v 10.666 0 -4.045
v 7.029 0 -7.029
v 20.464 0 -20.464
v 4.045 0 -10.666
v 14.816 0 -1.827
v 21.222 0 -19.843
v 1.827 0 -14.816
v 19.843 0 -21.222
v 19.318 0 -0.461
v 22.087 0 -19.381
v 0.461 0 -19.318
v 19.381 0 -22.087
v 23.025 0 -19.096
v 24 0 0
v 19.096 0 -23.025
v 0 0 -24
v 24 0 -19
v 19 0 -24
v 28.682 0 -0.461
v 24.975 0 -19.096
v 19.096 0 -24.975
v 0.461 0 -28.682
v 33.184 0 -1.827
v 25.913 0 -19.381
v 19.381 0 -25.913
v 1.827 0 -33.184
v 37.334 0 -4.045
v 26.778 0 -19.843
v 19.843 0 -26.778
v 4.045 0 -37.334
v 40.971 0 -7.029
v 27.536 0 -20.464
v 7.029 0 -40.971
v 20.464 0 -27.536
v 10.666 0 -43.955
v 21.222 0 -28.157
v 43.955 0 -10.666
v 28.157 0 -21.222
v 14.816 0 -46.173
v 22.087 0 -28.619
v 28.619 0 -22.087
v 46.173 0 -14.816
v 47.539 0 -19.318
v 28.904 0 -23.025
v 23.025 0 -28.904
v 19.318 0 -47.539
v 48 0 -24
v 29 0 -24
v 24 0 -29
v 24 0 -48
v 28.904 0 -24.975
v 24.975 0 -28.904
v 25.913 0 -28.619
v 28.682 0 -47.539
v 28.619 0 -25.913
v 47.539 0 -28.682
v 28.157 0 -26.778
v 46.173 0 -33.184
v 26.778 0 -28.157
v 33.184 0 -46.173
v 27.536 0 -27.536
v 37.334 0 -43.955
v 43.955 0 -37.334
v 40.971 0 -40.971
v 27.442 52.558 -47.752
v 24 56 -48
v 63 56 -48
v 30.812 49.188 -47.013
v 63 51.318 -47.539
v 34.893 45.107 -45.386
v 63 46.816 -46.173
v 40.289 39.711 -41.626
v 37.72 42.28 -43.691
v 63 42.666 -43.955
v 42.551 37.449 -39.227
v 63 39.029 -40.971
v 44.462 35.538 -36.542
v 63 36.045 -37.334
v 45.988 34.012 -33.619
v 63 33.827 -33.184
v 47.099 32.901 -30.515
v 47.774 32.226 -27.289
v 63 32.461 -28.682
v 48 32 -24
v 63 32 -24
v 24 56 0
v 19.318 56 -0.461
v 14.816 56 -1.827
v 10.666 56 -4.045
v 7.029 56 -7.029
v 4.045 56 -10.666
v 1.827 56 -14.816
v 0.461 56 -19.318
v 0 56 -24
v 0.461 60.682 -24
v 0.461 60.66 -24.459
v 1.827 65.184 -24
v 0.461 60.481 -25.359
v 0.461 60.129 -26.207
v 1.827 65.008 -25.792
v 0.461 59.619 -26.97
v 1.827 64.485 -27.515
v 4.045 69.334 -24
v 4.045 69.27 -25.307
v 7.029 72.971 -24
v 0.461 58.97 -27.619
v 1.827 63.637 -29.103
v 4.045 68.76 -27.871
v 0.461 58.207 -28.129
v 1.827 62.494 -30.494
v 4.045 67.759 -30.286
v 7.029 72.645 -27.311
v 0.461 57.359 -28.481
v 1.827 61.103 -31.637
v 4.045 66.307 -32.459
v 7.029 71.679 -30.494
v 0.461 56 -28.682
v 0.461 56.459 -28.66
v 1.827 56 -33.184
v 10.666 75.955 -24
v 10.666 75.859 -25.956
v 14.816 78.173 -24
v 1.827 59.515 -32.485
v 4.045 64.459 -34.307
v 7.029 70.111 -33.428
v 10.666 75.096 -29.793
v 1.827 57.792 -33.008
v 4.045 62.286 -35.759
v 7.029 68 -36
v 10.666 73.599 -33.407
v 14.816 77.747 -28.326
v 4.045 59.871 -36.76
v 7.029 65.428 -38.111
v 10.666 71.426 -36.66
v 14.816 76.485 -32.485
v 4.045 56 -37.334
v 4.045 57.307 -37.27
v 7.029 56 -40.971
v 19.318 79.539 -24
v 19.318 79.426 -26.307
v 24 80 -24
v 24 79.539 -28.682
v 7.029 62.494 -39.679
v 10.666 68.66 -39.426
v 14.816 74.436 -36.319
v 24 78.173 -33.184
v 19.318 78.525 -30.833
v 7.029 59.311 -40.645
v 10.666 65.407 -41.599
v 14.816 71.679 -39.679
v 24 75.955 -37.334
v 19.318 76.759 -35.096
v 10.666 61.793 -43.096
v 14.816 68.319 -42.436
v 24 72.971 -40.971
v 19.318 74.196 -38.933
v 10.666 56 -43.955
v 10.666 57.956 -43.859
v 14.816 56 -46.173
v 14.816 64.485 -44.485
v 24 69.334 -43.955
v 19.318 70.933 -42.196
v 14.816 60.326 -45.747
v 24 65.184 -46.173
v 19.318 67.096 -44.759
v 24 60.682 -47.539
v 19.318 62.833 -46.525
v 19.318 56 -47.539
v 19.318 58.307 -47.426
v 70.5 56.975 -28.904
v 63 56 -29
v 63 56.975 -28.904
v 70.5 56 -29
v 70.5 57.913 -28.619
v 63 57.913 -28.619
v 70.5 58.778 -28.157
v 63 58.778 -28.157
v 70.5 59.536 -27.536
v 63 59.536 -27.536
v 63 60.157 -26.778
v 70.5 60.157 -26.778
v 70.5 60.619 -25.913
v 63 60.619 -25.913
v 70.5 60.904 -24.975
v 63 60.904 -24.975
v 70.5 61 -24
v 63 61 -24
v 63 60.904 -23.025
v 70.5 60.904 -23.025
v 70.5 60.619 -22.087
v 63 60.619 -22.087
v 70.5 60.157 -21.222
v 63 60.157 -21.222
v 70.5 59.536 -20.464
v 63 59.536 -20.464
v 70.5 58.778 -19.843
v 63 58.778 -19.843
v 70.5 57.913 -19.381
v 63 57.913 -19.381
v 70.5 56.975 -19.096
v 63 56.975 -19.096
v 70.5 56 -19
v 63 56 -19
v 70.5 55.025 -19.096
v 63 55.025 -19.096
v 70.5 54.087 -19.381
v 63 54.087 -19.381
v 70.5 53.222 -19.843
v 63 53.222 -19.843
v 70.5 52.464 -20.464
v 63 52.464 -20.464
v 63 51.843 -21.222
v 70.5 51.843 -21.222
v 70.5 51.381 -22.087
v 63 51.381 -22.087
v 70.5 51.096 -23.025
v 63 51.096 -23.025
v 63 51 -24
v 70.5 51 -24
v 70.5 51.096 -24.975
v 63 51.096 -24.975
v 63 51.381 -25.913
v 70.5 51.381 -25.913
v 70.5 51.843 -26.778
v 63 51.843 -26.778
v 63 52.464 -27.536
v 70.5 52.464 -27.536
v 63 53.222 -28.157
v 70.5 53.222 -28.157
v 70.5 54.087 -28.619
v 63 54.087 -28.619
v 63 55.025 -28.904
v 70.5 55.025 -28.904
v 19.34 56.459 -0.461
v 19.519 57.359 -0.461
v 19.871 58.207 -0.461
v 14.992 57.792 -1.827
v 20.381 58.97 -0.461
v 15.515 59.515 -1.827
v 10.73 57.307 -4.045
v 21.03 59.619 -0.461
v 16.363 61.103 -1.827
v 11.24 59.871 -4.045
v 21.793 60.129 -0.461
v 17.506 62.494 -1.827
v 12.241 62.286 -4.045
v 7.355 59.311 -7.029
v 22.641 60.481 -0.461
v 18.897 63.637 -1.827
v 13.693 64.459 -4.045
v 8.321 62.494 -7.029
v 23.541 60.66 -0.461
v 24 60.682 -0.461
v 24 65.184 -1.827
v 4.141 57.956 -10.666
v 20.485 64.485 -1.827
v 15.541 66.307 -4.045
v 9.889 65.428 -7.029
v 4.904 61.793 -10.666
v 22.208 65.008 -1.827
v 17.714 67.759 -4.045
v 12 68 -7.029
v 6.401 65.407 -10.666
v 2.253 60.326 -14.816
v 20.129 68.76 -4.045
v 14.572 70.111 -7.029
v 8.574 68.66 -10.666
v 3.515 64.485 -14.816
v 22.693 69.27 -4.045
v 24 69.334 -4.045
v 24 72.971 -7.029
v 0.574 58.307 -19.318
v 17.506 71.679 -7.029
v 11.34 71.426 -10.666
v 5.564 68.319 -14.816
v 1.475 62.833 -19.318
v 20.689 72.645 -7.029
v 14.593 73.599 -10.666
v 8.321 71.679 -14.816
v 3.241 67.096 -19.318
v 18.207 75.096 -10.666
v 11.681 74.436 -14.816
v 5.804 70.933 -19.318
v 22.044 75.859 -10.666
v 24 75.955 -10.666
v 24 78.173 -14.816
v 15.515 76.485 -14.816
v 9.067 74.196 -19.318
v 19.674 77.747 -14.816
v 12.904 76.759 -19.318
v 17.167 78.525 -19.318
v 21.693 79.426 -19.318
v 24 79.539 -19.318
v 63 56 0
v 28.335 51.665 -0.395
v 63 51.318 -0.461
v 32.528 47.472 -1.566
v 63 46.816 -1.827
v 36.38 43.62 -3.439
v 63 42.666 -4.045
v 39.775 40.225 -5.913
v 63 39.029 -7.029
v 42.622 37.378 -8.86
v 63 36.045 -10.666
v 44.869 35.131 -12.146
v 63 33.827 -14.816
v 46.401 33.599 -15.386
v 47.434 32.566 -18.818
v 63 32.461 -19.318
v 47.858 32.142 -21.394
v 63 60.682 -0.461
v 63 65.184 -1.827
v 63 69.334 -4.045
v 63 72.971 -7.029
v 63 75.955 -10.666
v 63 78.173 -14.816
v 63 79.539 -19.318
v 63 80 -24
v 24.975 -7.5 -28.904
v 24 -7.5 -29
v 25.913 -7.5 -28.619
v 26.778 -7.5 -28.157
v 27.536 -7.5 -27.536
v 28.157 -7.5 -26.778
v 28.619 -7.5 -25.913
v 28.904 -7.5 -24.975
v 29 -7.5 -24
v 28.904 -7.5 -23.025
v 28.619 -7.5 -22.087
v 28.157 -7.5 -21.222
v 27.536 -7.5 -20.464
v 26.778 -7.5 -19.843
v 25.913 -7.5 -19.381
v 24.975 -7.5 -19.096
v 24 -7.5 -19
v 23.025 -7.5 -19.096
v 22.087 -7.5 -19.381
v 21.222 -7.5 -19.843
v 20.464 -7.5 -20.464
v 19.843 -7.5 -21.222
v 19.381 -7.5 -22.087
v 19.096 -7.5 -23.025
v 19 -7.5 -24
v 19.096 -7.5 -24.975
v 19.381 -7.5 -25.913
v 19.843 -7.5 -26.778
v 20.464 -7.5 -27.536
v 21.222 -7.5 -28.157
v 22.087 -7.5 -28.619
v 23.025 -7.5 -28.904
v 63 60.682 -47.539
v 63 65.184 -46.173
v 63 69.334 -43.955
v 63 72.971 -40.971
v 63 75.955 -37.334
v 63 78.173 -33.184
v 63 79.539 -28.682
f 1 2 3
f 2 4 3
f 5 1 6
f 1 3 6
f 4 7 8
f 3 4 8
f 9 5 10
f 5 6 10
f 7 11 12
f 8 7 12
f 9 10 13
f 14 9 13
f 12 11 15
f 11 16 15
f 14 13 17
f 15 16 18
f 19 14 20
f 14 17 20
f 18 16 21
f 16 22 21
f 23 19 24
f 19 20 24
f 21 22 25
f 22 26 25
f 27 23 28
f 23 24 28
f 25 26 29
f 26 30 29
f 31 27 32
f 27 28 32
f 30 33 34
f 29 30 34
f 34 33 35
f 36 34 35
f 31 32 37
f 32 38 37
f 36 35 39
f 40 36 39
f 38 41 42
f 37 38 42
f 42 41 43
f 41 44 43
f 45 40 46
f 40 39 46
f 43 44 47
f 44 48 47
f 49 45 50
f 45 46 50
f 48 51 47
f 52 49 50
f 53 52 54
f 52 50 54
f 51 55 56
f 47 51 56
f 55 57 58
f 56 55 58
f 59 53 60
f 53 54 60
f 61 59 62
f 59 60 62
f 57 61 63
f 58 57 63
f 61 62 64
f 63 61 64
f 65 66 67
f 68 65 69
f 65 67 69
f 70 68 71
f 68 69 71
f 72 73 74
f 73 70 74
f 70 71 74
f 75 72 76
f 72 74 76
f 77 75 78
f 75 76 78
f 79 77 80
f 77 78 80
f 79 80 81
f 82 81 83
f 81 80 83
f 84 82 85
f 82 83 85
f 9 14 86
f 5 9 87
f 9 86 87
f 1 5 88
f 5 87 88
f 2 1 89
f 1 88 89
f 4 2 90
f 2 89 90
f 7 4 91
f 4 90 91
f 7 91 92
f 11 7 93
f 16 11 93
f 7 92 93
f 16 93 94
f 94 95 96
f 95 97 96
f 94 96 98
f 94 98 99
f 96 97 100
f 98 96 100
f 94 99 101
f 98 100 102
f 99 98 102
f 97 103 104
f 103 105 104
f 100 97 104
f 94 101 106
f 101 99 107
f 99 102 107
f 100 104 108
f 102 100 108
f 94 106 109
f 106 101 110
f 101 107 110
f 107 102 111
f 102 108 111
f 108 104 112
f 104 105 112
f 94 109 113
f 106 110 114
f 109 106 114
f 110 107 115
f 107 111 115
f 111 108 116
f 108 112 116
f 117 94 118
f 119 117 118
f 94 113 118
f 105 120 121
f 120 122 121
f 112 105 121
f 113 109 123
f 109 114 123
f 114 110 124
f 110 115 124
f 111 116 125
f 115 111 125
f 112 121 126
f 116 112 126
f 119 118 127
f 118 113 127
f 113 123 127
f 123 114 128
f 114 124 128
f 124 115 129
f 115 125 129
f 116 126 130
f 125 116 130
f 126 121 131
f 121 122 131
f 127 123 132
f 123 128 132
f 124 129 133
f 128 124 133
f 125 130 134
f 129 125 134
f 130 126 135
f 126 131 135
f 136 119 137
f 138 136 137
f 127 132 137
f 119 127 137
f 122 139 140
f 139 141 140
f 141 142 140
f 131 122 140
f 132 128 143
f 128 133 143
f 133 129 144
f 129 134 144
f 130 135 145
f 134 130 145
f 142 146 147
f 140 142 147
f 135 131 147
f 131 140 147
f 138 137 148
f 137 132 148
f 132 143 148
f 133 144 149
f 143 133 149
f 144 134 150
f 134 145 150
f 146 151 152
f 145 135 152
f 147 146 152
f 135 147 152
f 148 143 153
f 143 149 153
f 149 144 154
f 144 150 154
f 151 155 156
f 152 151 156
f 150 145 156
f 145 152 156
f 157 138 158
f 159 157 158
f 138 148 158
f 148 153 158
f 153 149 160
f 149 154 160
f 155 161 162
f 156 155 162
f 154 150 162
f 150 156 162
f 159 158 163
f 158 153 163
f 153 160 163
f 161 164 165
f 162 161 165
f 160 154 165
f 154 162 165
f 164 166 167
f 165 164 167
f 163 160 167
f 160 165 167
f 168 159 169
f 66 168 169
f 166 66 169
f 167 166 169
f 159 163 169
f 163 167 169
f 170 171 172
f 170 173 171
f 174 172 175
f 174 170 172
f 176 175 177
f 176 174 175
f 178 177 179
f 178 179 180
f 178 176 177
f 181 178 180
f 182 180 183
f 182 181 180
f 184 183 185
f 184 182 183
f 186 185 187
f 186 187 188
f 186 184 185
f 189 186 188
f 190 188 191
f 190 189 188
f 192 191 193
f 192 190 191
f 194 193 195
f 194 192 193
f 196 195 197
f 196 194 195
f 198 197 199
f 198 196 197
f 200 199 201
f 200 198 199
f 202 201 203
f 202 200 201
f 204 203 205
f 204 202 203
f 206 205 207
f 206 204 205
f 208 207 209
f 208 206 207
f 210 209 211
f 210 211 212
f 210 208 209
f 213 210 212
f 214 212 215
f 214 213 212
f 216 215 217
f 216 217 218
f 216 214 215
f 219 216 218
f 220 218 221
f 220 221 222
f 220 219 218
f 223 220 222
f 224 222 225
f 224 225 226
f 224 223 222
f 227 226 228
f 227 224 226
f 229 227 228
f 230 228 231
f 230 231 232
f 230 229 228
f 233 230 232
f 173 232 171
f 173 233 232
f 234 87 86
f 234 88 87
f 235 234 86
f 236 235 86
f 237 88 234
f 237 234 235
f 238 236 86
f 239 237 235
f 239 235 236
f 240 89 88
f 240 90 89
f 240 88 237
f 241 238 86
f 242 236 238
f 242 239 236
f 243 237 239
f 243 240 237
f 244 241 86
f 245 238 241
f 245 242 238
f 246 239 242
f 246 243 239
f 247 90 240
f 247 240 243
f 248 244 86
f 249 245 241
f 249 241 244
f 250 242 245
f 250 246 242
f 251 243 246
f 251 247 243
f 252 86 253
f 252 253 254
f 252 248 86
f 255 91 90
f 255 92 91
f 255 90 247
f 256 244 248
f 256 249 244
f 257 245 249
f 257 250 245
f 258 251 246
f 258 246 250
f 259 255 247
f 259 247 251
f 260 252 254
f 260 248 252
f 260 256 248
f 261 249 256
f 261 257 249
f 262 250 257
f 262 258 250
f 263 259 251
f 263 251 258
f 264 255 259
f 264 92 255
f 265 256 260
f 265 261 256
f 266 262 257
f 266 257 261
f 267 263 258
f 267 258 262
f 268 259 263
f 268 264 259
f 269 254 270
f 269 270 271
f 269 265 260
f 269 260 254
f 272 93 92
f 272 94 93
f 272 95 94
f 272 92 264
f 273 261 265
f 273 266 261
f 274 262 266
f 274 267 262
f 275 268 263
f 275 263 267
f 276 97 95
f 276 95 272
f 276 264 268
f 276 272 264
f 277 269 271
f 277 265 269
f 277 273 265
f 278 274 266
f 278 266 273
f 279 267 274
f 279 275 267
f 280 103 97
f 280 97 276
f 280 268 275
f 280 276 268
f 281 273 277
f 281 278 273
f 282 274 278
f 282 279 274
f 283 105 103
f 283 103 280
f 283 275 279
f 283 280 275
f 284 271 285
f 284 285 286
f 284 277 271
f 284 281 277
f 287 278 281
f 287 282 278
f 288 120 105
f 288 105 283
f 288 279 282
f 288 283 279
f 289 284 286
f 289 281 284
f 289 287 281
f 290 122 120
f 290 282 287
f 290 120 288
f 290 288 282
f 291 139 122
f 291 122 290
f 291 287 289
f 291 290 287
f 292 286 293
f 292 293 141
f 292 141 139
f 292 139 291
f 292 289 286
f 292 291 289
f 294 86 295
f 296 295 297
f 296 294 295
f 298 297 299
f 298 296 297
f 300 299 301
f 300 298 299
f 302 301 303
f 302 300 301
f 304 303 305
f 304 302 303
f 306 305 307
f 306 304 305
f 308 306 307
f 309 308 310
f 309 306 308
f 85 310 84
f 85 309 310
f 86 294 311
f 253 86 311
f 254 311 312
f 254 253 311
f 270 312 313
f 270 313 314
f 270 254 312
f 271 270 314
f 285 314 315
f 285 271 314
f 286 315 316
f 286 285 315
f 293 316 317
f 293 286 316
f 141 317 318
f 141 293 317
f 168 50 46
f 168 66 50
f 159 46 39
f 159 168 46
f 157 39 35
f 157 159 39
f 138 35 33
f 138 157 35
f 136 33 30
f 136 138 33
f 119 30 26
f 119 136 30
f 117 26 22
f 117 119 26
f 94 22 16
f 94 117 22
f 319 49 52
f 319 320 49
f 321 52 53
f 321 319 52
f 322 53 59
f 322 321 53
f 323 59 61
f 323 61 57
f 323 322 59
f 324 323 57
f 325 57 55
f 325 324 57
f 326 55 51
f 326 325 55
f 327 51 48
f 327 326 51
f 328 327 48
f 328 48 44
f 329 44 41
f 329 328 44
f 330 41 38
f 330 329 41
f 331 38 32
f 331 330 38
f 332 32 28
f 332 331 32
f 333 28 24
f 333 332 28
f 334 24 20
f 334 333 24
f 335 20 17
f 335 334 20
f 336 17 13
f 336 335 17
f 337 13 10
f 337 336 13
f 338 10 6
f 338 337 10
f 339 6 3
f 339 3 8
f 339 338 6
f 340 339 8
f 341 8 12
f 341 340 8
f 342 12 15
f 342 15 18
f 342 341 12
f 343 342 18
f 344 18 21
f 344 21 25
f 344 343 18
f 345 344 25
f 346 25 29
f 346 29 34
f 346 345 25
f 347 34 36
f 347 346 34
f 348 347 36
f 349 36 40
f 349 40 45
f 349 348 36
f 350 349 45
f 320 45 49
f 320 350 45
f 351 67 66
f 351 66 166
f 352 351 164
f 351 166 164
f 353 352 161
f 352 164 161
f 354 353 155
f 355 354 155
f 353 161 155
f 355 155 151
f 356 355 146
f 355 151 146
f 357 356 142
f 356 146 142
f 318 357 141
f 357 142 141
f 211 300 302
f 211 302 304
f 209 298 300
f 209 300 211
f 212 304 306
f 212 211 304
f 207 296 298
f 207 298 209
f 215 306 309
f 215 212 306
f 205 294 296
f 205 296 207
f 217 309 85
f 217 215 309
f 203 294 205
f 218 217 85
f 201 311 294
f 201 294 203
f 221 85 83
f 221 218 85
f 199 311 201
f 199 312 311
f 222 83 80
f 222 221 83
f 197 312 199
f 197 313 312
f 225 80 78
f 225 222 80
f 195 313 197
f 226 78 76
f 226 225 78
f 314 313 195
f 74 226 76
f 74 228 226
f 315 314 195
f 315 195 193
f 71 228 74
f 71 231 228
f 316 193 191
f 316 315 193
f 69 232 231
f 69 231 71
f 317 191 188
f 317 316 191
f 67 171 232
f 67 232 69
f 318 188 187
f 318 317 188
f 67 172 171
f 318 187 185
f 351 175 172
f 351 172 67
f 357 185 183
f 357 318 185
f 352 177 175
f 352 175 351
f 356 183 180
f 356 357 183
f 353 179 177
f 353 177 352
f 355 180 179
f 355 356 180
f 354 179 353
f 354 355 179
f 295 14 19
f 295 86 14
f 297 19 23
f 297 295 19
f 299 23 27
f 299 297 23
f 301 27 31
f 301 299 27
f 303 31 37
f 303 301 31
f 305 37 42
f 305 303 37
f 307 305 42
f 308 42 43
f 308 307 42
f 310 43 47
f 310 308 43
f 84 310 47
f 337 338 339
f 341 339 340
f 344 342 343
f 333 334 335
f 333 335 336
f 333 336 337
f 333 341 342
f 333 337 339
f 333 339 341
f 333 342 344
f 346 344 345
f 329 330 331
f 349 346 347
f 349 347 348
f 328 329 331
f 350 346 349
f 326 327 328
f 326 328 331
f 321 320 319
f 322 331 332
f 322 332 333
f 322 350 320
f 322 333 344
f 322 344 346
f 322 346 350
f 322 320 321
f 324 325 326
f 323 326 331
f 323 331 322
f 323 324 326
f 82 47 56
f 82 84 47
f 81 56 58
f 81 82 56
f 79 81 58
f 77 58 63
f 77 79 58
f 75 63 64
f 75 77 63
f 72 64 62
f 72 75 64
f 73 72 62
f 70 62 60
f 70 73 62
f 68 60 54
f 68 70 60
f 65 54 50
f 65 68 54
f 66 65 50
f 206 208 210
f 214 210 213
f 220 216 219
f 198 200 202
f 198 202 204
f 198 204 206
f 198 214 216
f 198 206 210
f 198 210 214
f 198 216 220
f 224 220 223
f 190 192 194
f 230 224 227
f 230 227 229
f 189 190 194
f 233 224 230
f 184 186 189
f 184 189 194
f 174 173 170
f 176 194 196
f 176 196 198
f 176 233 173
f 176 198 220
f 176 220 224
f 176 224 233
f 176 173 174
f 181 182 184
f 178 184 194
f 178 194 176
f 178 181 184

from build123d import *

# Parameters (mm, degrees)
SKETCH1_W           = 48
SKETCH1_H           = 48
BOSS_EXTRUDE1_DEPTH = 80
SKETCH2_W           = 48
SKETCH2_H           = 48
BOSS_EXTRUDE2_DEPTH = 15
FILLET2_R           = 24
SKETCH3_R           = 5
BOSS_EXTRUDE3_DEPTH = 7.5
SKETCH4_R           = 5
BOSS_EXTRUDE4_DEPTH = 7.5


with BuildPart() as part:
    # Sketch1 → Boss-Extrude1 (new body)
    with BuildSketch(Plane(origin=(0, 0, 0), x_dir=(1, 0, 0), z_dir=(0, 1, 0))):
        with Locations((24, 24)):
            Rectangle(SKETCH1_W, SKETCH1_H)
    extrude(amount=BOSS_EXTRUDE1_DEPTH)

    # Sketch2 → Boss-Extrude2 (add)
    with BuildSketch(Plane(origin=(48, 0, 0), x_dir=(0, 0, -1), z_dir=(1, 0, 0))):
        with Locations((24, 56)):
            Rectangle(SKETCH2_W, SKETCH2_H)
    extrude(amount=BOSS_EXTRUDE2_DEPTH)

    # Fillet2
    fillet2_edges = [part.edges().sort_by_distance(p)[0] for p in [
        (48, 16, -48),
        (48, 16, 0),
        (55.5, 32, 0),
        (31.5, 80, -48),
        (55.5, 32, -48),
        (0, 80, -24),
        (0, 40, -48),
        (0, 40, 0),
        (31.5, 80, 0),
    ]]
    fillet(fillet2_edges, radius=FILLET2_R - 0.0001)  # a hair under: the kernel refuses the full size

    # Sketch3 → Boss-Extrude3 (add, symmetric)
    with BuildSketch(Plane(origin=(0, 0, 0), x_dir=(-1, 0, 0), z_dir=(0, -1, 0))):
        with Locations(Location((-24, 24, 0), (0, 0, 90))):
            Circle(SKETCH3_R)
    extrude(amount=BOSS_EXTRUDE3_DEPTH, both=True)

    # Sketch4 → Boss-Extrude4 (add, symmetric)
    with BuildSketch(Plane(origin=(63, 0, 0), x_dir=(0, 0, -1), z_dir=(1, 0, 0))):
        with Locations((24, 56)):
            Circle(SKETCH4_R)
    extrude(amount=BOSS_EXTRUDE4_DEPTH, both=True)


solid = part.part
